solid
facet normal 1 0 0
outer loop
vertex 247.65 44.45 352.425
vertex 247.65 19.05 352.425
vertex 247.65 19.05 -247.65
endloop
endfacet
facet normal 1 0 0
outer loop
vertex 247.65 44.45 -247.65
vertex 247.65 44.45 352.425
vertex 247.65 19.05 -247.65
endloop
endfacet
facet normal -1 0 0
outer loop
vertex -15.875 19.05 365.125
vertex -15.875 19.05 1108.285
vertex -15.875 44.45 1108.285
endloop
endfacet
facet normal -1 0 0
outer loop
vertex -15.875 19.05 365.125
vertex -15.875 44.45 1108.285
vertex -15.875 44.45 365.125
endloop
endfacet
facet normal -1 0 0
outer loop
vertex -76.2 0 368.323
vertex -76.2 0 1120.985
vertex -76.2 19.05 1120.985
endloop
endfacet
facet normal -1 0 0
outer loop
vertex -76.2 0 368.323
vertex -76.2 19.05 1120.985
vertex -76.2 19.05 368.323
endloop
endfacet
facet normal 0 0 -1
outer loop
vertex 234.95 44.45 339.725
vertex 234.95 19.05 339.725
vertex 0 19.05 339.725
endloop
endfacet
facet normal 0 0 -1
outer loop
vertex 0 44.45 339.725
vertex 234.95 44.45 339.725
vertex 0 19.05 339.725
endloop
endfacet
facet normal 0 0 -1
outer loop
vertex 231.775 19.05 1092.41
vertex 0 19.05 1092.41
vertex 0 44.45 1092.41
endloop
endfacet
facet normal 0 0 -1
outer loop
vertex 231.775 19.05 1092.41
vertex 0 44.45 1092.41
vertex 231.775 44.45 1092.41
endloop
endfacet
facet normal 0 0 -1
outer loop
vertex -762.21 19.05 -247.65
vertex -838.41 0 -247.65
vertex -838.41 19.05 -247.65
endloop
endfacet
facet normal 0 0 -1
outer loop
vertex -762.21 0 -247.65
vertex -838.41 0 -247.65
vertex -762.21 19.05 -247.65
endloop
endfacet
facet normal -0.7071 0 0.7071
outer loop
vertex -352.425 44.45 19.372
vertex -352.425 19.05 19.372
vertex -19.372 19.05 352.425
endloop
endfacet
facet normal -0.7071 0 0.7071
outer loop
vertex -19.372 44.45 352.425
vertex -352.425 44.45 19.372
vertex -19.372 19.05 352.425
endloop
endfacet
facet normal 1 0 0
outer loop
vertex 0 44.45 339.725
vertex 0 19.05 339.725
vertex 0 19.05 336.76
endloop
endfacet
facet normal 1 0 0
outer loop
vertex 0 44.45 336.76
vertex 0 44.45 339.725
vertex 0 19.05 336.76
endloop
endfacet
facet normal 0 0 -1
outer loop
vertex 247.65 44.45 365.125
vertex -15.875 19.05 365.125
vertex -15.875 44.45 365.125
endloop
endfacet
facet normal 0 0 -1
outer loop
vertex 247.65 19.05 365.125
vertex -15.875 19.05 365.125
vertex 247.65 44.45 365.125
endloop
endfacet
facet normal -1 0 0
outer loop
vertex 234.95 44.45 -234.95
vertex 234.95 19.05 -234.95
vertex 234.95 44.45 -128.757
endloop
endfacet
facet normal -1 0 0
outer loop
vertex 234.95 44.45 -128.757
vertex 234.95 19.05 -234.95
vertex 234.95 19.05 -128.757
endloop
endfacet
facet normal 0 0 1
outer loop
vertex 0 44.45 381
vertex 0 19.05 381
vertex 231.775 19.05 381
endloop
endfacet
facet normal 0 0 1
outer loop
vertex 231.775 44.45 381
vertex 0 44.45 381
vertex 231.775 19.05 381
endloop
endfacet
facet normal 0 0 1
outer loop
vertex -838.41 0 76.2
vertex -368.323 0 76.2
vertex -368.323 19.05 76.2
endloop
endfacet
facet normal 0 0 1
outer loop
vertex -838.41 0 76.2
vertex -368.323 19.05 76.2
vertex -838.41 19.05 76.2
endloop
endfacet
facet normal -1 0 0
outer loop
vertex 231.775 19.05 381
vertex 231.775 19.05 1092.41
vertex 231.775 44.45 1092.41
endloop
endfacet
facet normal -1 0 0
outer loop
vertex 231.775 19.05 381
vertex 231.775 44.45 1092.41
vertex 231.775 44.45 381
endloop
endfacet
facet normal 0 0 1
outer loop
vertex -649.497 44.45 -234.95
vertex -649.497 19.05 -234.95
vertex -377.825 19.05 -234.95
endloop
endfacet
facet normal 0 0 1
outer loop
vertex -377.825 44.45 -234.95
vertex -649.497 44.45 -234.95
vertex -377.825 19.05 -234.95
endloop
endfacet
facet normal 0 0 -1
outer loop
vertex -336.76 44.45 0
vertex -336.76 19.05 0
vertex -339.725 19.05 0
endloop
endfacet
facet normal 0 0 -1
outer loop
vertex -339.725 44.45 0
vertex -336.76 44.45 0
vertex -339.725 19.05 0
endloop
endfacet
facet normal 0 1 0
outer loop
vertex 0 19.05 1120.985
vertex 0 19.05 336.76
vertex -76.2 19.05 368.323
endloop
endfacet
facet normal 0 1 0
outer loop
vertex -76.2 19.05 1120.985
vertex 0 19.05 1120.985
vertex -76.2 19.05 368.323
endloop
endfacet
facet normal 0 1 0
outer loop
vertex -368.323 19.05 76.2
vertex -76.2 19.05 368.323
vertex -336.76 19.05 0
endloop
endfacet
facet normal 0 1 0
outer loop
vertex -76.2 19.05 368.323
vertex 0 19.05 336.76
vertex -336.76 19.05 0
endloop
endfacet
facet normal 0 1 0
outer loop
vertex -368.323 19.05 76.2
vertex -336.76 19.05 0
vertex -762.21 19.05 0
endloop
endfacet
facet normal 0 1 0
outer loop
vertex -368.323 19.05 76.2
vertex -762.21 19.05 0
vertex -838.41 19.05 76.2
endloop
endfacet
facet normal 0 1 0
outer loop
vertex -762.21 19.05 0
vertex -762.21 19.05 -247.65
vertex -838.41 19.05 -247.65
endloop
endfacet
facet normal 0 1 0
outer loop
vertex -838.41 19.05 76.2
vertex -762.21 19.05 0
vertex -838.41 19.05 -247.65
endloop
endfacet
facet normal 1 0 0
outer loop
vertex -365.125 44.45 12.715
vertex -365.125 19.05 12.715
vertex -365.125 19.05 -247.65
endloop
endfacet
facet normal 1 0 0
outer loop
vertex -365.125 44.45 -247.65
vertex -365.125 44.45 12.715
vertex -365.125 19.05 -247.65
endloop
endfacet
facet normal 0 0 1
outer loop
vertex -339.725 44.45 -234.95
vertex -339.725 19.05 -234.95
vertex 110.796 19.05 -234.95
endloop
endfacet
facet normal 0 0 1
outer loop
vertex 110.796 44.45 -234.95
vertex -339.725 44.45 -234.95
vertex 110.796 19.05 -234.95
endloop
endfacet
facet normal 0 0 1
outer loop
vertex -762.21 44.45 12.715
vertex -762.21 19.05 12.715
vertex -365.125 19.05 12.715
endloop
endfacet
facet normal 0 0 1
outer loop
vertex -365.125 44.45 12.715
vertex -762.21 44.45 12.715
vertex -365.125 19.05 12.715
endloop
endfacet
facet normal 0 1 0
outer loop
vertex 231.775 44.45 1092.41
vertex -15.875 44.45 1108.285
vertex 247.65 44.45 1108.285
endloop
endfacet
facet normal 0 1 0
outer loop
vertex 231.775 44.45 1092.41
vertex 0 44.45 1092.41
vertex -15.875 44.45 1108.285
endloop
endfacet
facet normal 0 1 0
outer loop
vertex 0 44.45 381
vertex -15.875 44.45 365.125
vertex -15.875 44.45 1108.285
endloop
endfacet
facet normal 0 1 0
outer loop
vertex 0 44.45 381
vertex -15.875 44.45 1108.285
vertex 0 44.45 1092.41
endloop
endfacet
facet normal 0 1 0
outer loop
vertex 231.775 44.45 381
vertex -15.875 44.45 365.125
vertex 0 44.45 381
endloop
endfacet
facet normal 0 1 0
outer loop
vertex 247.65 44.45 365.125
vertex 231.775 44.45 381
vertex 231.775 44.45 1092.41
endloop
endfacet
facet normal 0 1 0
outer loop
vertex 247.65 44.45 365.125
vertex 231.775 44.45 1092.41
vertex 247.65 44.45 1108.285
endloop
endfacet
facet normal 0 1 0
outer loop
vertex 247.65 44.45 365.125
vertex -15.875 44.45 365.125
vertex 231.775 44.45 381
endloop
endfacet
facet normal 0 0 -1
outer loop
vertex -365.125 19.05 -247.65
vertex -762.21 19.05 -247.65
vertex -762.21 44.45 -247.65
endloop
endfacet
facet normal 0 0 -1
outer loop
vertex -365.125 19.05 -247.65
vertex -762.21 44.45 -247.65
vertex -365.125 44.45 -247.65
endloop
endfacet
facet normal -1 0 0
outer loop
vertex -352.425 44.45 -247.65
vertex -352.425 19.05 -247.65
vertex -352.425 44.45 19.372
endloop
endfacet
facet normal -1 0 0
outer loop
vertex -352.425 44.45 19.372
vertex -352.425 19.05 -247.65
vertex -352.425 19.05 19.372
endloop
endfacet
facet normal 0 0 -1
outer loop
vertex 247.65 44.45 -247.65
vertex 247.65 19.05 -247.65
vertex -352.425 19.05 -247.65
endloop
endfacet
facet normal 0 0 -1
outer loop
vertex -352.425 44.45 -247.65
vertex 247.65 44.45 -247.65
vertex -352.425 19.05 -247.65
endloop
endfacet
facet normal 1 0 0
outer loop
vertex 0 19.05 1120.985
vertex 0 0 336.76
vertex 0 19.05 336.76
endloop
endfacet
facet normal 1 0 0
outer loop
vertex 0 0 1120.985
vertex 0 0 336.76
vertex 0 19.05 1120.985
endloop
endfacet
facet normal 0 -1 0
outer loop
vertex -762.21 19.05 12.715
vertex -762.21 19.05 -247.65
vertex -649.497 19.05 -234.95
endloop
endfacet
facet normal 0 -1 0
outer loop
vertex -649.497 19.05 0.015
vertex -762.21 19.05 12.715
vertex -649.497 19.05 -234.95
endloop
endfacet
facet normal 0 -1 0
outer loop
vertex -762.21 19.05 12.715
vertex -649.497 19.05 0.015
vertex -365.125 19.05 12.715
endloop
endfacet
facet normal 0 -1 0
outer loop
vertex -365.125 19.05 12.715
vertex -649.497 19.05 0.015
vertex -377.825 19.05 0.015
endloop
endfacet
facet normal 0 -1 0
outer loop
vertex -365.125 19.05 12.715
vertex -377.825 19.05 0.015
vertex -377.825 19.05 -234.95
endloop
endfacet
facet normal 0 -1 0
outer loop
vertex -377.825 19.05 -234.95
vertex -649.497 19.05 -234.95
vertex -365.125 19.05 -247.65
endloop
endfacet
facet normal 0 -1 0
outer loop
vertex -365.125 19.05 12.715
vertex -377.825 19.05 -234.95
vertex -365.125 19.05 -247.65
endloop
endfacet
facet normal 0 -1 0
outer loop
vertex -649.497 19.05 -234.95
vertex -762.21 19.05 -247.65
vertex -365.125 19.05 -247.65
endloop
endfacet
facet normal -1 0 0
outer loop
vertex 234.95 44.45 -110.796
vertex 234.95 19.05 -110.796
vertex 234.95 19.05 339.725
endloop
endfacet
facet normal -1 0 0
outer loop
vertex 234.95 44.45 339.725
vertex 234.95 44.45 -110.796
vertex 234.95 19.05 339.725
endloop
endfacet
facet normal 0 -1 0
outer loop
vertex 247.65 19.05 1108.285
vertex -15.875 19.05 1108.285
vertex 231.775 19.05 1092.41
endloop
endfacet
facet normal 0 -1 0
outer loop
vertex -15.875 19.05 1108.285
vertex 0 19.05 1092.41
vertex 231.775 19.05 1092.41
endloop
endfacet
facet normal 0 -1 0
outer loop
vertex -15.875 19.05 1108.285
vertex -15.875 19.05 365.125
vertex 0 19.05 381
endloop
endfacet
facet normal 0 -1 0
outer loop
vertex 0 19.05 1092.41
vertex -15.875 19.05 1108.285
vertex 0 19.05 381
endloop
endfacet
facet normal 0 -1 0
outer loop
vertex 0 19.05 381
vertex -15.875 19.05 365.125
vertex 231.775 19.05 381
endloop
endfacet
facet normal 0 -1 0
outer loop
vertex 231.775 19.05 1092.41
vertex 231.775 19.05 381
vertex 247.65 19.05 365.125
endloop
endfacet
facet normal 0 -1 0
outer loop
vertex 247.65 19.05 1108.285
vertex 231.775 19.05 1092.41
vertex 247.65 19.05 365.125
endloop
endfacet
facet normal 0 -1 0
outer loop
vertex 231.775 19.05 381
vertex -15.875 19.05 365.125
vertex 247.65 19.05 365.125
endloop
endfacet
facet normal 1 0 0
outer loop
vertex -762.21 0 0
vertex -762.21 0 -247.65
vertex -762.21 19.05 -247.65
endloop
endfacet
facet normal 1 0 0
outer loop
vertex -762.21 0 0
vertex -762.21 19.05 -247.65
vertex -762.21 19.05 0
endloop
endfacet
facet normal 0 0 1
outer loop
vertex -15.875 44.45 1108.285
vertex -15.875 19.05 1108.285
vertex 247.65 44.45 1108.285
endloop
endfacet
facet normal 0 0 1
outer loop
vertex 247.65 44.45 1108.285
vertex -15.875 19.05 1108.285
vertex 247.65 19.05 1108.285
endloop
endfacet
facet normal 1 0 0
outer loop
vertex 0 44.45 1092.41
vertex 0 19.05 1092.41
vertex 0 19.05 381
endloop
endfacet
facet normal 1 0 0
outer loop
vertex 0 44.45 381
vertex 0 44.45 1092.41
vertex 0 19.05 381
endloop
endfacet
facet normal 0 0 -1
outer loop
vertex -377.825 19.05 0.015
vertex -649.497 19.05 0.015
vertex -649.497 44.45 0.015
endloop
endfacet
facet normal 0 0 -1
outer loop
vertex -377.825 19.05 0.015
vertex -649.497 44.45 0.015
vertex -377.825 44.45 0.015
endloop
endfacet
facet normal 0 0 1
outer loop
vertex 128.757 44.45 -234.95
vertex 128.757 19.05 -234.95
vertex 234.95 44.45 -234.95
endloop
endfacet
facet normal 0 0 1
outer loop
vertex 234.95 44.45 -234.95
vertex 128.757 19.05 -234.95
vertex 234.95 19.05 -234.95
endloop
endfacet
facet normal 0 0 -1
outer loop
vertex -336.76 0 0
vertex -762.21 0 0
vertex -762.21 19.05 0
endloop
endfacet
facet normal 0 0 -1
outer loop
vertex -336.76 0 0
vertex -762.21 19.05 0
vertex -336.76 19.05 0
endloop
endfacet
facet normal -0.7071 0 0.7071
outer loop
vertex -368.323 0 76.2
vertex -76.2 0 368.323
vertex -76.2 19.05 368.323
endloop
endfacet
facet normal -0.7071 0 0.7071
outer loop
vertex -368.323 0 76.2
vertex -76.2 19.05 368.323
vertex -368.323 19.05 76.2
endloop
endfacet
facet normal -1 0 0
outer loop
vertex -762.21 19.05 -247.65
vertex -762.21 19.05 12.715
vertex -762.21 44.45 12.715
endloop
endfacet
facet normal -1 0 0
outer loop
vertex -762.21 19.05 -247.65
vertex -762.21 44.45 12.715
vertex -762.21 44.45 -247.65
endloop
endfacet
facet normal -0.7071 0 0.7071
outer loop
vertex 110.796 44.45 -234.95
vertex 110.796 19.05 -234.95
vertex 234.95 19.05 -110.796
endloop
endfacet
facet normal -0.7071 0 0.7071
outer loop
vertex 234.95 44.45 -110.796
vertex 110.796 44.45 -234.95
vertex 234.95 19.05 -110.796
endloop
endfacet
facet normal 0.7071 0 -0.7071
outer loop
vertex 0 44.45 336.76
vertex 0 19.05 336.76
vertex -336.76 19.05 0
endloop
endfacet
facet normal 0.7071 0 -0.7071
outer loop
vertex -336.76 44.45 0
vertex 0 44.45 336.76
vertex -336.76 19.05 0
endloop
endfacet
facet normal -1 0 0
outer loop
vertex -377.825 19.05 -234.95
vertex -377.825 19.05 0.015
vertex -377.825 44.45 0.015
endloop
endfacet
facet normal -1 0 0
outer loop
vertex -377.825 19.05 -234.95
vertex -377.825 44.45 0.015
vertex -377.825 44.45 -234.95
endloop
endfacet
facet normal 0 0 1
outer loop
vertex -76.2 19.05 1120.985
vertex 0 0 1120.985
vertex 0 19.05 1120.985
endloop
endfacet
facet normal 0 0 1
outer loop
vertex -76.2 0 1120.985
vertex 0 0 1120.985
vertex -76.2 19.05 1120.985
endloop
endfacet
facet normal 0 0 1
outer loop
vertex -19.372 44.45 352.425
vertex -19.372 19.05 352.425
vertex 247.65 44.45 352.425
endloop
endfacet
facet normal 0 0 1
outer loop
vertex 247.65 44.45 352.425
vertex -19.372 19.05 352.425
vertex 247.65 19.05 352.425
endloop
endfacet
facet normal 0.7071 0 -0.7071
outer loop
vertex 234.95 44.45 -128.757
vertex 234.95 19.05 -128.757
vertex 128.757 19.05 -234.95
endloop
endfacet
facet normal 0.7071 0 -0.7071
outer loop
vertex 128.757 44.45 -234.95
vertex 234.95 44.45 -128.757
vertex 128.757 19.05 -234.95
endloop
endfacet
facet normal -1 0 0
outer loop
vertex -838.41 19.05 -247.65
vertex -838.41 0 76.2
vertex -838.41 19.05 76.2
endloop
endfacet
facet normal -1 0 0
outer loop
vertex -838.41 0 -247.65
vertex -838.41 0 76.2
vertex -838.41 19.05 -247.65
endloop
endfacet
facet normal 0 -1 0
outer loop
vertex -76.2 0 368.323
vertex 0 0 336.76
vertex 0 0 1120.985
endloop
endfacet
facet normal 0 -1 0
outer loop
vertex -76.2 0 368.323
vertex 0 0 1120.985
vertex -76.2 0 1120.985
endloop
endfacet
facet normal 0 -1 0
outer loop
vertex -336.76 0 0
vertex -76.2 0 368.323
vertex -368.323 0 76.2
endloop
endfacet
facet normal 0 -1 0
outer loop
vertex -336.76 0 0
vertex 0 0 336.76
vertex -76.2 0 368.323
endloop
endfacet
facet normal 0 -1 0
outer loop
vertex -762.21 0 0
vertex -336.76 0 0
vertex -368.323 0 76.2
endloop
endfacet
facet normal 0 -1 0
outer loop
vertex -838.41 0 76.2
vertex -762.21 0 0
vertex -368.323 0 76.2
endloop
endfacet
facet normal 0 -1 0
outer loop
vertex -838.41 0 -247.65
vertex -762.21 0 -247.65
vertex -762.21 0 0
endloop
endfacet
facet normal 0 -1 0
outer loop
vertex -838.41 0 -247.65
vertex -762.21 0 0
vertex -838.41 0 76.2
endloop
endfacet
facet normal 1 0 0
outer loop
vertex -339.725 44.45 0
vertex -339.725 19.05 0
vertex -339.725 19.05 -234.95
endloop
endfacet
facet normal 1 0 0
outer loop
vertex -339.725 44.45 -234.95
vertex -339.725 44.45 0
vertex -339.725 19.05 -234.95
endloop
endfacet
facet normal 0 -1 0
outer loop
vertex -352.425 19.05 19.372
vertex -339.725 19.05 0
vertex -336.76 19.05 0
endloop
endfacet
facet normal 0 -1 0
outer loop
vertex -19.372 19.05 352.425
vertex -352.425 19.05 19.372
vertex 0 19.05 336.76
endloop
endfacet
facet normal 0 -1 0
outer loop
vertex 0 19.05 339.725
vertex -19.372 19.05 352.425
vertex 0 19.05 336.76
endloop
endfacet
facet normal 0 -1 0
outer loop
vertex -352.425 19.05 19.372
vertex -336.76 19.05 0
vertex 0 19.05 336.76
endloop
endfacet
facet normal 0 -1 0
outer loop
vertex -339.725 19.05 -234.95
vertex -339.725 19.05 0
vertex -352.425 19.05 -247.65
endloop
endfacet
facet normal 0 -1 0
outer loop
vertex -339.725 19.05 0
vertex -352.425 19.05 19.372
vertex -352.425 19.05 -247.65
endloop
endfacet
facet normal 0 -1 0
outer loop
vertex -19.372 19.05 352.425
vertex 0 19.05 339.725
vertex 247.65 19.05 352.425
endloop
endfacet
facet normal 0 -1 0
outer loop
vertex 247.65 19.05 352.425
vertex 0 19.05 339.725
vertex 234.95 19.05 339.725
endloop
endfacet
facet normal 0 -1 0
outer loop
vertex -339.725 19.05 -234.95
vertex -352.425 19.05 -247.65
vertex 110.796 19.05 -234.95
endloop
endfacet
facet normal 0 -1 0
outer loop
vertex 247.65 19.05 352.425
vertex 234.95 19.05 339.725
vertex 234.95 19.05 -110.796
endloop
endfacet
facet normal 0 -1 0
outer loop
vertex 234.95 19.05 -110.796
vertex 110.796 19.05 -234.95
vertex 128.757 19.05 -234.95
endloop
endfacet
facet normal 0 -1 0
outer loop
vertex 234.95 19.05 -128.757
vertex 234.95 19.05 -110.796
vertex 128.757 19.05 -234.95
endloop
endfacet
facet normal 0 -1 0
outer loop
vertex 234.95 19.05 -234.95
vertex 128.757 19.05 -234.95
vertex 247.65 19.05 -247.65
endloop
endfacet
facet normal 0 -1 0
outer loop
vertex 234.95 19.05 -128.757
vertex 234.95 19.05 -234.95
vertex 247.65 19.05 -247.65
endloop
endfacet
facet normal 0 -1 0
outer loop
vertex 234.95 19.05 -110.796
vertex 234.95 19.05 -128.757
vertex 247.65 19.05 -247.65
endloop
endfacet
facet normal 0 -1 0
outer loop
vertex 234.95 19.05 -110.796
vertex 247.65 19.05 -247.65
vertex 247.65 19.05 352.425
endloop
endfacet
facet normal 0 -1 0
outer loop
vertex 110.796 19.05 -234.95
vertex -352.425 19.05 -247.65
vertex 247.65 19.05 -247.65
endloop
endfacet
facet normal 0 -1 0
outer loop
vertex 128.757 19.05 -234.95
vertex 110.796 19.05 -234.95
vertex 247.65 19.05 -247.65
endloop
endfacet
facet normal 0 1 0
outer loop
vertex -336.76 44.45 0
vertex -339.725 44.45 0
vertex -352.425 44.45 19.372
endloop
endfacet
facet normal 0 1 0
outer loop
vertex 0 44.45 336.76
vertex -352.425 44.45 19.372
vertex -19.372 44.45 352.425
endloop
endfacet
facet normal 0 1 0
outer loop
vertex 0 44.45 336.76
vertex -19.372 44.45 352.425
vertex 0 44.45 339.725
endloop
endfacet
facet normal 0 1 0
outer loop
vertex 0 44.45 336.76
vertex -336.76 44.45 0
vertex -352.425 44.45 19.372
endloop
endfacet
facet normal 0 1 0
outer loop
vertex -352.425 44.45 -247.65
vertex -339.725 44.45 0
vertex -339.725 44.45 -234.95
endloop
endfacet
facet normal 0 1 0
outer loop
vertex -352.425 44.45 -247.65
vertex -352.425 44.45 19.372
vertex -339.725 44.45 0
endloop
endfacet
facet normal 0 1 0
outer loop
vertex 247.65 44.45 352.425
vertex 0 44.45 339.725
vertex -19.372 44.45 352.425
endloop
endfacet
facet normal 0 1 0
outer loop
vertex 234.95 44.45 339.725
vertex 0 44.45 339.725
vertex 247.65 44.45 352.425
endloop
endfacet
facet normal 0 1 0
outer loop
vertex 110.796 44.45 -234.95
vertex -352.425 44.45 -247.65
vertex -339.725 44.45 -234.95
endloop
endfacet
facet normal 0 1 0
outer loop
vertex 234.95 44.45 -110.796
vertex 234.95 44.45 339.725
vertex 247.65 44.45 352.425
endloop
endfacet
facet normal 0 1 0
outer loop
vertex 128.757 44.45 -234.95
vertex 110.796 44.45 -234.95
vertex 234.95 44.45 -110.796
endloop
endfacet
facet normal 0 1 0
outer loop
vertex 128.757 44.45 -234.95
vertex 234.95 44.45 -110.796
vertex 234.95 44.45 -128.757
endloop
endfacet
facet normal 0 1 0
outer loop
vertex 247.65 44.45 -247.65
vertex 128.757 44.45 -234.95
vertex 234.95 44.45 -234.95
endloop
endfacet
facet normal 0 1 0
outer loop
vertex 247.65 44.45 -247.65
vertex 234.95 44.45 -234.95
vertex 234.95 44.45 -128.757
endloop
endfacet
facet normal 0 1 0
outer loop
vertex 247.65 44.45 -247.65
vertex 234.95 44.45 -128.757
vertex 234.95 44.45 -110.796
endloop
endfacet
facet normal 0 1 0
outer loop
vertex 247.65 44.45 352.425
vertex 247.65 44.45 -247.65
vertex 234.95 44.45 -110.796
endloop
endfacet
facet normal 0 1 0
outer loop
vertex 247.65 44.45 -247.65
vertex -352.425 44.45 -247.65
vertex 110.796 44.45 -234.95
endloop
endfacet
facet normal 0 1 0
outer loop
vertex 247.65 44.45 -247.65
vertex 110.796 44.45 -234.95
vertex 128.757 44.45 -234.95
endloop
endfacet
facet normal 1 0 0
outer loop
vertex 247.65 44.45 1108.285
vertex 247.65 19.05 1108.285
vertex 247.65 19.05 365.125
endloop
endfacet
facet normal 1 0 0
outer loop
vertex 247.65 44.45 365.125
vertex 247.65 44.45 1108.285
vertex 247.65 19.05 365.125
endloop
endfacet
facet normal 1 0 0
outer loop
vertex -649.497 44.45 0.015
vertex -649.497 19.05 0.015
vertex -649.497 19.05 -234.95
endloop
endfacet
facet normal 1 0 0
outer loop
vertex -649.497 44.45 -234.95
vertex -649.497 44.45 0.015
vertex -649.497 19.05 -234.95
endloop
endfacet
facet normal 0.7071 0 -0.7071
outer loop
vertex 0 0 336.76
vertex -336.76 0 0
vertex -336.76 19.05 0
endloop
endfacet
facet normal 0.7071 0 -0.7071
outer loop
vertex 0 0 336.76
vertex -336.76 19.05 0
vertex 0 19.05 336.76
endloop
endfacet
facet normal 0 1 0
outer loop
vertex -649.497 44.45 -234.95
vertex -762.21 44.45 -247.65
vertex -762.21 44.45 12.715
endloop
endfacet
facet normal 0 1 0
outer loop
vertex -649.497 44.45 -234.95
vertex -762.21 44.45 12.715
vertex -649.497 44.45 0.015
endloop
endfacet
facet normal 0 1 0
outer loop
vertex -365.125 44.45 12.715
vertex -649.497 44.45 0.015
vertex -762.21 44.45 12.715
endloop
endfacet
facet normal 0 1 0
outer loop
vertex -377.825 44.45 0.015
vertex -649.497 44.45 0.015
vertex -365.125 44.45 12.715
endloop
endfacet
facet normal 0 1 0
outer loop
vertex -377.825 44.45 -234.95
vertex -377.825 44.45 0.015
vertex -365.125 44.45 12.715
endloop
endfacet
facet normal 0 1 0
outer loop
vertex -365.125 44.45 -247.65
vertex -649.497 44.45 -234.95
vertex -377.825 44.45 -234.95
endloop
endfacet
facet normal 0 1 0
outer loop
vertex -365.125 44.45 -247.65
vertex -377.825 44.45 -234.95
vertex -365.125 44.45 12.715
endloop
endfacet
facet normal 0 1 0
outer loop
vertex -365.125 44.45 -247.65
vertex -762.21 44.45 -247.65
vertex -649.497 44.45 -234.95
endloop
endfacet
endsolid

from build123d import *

# Parameters (mm, degrees)
MOULDING_DEPTH        = 19.05
BOSS_EXTRUDE4_DEPTH   = 25.4
SKETCH2_W             = 397.08460454
SKETCH2_H             = 260.364767801
SKETCH2_W_2           = 271.67210454
SKETCH2_H_2           = 234.964767801
BOSS_EXTRUDE4_2_DEPTH = 25.4
SKETCH2_W_3           = 263.525
SKETCH2_H_3           = 743.15960454
SKETCH2_W_4           = 231.775
SKETCH2_H_4           = 711.40960454
BOSS_EXTRUDE4_3_DEPTH = 25.4


with BuildPart() as part:
    # Sketch1 → Moulding (new body)
    with BuildSketch(Plane(origin=(0, 0, 0), x_dir=(1, 0, 0), z_dir=(0, 1, 0))):
        Polygon((-336.75960454, 0), (0, -336.75960454), (0, -1120.98460454), (-76.2, -1120.98460454), (-76.2, -368.322677993), (-368.322677993, -76.2), (-838.40960454, -76.2), (-838.40960454, 247.65), (-762.20960454, 247.65), (-762.20960454, 0), align=None)
    extrude(amount=MOULDING_DEPTH)


with BuildPart() as body_2:
    # Sketch2 → Boss-Extrude4 (new body)
    with BuildSketch(Plane(origin=(0, 19.05, 0), x_dir=(1, 0, 0), z_dir=(0, 1, 0))):
        Polygon((-352.425, 247.65), (-352.425, -19.372479083), (-19.372479083, -352.425), (247.65, -352.425), (247.65, 247.65), align=None)
        Polygon((-339.725, 0), (-339.725, 234.95), (110.796254172, 234.95), (234.95, 110.796254172), (234.95, -339.725), (0, -339.725), (0, -336.75960454), (-336.75960454, 0), align=None, mode=Mode.SUBTRACT)
        Polygon((128.756766414, 234.95), (234.95, 234.95), (234.95, 128.756766414), align=None, mode=Mode.SUBTRACT)
    extrude(amount=BOSS_EXTRUDE4_DEPTH)


with BuildPart() as body_3:
    # Sketch2 → Boss-Extrude4 2 (new body)
    with BuildSketch(Plane(origin=(0, 19.05, 0), x_dir=(1, 0, 0), z_dir=(0, 1, 0))):
        with Locations((-563.66730227, 117.4676161)):
            Rectangle(SKETCH2_W, SKETCH2_H)
        with Locations((-513.66105227, 117.4676161)):
            Rectangle(SKETCH2_W_2, SKETCH2_H_2, mode=Mode.SUBTRACT)
    extrude(amount=BOSS_EXTRUDE4_2_DEPTH)


with BuildPart() as body_4:
    # Sketch2 → Boss-Extrude4 3 (new body)
    with BuildSketch(Plane(origin=(0, 19.05, 0), x_dir=(1, 0, 0), z_dir=(0, 1, 0))):
        with Locations((115.8875, -736.70480227)):
            Rectangle(SKETCH2_W_3, SKETCH2_H_3)
        with Locations((115.8875, -736.70480227)):
            Rectangle(SKETCH2_W_4, SKETCH2_H_4, mode=Mode.SUBTRACT)
    extrude(amount=BOSS_EXTRUDE4_3_DEPTH)


solid = Compound([part.part, body_2.part, body_3.part, body_4.part])
